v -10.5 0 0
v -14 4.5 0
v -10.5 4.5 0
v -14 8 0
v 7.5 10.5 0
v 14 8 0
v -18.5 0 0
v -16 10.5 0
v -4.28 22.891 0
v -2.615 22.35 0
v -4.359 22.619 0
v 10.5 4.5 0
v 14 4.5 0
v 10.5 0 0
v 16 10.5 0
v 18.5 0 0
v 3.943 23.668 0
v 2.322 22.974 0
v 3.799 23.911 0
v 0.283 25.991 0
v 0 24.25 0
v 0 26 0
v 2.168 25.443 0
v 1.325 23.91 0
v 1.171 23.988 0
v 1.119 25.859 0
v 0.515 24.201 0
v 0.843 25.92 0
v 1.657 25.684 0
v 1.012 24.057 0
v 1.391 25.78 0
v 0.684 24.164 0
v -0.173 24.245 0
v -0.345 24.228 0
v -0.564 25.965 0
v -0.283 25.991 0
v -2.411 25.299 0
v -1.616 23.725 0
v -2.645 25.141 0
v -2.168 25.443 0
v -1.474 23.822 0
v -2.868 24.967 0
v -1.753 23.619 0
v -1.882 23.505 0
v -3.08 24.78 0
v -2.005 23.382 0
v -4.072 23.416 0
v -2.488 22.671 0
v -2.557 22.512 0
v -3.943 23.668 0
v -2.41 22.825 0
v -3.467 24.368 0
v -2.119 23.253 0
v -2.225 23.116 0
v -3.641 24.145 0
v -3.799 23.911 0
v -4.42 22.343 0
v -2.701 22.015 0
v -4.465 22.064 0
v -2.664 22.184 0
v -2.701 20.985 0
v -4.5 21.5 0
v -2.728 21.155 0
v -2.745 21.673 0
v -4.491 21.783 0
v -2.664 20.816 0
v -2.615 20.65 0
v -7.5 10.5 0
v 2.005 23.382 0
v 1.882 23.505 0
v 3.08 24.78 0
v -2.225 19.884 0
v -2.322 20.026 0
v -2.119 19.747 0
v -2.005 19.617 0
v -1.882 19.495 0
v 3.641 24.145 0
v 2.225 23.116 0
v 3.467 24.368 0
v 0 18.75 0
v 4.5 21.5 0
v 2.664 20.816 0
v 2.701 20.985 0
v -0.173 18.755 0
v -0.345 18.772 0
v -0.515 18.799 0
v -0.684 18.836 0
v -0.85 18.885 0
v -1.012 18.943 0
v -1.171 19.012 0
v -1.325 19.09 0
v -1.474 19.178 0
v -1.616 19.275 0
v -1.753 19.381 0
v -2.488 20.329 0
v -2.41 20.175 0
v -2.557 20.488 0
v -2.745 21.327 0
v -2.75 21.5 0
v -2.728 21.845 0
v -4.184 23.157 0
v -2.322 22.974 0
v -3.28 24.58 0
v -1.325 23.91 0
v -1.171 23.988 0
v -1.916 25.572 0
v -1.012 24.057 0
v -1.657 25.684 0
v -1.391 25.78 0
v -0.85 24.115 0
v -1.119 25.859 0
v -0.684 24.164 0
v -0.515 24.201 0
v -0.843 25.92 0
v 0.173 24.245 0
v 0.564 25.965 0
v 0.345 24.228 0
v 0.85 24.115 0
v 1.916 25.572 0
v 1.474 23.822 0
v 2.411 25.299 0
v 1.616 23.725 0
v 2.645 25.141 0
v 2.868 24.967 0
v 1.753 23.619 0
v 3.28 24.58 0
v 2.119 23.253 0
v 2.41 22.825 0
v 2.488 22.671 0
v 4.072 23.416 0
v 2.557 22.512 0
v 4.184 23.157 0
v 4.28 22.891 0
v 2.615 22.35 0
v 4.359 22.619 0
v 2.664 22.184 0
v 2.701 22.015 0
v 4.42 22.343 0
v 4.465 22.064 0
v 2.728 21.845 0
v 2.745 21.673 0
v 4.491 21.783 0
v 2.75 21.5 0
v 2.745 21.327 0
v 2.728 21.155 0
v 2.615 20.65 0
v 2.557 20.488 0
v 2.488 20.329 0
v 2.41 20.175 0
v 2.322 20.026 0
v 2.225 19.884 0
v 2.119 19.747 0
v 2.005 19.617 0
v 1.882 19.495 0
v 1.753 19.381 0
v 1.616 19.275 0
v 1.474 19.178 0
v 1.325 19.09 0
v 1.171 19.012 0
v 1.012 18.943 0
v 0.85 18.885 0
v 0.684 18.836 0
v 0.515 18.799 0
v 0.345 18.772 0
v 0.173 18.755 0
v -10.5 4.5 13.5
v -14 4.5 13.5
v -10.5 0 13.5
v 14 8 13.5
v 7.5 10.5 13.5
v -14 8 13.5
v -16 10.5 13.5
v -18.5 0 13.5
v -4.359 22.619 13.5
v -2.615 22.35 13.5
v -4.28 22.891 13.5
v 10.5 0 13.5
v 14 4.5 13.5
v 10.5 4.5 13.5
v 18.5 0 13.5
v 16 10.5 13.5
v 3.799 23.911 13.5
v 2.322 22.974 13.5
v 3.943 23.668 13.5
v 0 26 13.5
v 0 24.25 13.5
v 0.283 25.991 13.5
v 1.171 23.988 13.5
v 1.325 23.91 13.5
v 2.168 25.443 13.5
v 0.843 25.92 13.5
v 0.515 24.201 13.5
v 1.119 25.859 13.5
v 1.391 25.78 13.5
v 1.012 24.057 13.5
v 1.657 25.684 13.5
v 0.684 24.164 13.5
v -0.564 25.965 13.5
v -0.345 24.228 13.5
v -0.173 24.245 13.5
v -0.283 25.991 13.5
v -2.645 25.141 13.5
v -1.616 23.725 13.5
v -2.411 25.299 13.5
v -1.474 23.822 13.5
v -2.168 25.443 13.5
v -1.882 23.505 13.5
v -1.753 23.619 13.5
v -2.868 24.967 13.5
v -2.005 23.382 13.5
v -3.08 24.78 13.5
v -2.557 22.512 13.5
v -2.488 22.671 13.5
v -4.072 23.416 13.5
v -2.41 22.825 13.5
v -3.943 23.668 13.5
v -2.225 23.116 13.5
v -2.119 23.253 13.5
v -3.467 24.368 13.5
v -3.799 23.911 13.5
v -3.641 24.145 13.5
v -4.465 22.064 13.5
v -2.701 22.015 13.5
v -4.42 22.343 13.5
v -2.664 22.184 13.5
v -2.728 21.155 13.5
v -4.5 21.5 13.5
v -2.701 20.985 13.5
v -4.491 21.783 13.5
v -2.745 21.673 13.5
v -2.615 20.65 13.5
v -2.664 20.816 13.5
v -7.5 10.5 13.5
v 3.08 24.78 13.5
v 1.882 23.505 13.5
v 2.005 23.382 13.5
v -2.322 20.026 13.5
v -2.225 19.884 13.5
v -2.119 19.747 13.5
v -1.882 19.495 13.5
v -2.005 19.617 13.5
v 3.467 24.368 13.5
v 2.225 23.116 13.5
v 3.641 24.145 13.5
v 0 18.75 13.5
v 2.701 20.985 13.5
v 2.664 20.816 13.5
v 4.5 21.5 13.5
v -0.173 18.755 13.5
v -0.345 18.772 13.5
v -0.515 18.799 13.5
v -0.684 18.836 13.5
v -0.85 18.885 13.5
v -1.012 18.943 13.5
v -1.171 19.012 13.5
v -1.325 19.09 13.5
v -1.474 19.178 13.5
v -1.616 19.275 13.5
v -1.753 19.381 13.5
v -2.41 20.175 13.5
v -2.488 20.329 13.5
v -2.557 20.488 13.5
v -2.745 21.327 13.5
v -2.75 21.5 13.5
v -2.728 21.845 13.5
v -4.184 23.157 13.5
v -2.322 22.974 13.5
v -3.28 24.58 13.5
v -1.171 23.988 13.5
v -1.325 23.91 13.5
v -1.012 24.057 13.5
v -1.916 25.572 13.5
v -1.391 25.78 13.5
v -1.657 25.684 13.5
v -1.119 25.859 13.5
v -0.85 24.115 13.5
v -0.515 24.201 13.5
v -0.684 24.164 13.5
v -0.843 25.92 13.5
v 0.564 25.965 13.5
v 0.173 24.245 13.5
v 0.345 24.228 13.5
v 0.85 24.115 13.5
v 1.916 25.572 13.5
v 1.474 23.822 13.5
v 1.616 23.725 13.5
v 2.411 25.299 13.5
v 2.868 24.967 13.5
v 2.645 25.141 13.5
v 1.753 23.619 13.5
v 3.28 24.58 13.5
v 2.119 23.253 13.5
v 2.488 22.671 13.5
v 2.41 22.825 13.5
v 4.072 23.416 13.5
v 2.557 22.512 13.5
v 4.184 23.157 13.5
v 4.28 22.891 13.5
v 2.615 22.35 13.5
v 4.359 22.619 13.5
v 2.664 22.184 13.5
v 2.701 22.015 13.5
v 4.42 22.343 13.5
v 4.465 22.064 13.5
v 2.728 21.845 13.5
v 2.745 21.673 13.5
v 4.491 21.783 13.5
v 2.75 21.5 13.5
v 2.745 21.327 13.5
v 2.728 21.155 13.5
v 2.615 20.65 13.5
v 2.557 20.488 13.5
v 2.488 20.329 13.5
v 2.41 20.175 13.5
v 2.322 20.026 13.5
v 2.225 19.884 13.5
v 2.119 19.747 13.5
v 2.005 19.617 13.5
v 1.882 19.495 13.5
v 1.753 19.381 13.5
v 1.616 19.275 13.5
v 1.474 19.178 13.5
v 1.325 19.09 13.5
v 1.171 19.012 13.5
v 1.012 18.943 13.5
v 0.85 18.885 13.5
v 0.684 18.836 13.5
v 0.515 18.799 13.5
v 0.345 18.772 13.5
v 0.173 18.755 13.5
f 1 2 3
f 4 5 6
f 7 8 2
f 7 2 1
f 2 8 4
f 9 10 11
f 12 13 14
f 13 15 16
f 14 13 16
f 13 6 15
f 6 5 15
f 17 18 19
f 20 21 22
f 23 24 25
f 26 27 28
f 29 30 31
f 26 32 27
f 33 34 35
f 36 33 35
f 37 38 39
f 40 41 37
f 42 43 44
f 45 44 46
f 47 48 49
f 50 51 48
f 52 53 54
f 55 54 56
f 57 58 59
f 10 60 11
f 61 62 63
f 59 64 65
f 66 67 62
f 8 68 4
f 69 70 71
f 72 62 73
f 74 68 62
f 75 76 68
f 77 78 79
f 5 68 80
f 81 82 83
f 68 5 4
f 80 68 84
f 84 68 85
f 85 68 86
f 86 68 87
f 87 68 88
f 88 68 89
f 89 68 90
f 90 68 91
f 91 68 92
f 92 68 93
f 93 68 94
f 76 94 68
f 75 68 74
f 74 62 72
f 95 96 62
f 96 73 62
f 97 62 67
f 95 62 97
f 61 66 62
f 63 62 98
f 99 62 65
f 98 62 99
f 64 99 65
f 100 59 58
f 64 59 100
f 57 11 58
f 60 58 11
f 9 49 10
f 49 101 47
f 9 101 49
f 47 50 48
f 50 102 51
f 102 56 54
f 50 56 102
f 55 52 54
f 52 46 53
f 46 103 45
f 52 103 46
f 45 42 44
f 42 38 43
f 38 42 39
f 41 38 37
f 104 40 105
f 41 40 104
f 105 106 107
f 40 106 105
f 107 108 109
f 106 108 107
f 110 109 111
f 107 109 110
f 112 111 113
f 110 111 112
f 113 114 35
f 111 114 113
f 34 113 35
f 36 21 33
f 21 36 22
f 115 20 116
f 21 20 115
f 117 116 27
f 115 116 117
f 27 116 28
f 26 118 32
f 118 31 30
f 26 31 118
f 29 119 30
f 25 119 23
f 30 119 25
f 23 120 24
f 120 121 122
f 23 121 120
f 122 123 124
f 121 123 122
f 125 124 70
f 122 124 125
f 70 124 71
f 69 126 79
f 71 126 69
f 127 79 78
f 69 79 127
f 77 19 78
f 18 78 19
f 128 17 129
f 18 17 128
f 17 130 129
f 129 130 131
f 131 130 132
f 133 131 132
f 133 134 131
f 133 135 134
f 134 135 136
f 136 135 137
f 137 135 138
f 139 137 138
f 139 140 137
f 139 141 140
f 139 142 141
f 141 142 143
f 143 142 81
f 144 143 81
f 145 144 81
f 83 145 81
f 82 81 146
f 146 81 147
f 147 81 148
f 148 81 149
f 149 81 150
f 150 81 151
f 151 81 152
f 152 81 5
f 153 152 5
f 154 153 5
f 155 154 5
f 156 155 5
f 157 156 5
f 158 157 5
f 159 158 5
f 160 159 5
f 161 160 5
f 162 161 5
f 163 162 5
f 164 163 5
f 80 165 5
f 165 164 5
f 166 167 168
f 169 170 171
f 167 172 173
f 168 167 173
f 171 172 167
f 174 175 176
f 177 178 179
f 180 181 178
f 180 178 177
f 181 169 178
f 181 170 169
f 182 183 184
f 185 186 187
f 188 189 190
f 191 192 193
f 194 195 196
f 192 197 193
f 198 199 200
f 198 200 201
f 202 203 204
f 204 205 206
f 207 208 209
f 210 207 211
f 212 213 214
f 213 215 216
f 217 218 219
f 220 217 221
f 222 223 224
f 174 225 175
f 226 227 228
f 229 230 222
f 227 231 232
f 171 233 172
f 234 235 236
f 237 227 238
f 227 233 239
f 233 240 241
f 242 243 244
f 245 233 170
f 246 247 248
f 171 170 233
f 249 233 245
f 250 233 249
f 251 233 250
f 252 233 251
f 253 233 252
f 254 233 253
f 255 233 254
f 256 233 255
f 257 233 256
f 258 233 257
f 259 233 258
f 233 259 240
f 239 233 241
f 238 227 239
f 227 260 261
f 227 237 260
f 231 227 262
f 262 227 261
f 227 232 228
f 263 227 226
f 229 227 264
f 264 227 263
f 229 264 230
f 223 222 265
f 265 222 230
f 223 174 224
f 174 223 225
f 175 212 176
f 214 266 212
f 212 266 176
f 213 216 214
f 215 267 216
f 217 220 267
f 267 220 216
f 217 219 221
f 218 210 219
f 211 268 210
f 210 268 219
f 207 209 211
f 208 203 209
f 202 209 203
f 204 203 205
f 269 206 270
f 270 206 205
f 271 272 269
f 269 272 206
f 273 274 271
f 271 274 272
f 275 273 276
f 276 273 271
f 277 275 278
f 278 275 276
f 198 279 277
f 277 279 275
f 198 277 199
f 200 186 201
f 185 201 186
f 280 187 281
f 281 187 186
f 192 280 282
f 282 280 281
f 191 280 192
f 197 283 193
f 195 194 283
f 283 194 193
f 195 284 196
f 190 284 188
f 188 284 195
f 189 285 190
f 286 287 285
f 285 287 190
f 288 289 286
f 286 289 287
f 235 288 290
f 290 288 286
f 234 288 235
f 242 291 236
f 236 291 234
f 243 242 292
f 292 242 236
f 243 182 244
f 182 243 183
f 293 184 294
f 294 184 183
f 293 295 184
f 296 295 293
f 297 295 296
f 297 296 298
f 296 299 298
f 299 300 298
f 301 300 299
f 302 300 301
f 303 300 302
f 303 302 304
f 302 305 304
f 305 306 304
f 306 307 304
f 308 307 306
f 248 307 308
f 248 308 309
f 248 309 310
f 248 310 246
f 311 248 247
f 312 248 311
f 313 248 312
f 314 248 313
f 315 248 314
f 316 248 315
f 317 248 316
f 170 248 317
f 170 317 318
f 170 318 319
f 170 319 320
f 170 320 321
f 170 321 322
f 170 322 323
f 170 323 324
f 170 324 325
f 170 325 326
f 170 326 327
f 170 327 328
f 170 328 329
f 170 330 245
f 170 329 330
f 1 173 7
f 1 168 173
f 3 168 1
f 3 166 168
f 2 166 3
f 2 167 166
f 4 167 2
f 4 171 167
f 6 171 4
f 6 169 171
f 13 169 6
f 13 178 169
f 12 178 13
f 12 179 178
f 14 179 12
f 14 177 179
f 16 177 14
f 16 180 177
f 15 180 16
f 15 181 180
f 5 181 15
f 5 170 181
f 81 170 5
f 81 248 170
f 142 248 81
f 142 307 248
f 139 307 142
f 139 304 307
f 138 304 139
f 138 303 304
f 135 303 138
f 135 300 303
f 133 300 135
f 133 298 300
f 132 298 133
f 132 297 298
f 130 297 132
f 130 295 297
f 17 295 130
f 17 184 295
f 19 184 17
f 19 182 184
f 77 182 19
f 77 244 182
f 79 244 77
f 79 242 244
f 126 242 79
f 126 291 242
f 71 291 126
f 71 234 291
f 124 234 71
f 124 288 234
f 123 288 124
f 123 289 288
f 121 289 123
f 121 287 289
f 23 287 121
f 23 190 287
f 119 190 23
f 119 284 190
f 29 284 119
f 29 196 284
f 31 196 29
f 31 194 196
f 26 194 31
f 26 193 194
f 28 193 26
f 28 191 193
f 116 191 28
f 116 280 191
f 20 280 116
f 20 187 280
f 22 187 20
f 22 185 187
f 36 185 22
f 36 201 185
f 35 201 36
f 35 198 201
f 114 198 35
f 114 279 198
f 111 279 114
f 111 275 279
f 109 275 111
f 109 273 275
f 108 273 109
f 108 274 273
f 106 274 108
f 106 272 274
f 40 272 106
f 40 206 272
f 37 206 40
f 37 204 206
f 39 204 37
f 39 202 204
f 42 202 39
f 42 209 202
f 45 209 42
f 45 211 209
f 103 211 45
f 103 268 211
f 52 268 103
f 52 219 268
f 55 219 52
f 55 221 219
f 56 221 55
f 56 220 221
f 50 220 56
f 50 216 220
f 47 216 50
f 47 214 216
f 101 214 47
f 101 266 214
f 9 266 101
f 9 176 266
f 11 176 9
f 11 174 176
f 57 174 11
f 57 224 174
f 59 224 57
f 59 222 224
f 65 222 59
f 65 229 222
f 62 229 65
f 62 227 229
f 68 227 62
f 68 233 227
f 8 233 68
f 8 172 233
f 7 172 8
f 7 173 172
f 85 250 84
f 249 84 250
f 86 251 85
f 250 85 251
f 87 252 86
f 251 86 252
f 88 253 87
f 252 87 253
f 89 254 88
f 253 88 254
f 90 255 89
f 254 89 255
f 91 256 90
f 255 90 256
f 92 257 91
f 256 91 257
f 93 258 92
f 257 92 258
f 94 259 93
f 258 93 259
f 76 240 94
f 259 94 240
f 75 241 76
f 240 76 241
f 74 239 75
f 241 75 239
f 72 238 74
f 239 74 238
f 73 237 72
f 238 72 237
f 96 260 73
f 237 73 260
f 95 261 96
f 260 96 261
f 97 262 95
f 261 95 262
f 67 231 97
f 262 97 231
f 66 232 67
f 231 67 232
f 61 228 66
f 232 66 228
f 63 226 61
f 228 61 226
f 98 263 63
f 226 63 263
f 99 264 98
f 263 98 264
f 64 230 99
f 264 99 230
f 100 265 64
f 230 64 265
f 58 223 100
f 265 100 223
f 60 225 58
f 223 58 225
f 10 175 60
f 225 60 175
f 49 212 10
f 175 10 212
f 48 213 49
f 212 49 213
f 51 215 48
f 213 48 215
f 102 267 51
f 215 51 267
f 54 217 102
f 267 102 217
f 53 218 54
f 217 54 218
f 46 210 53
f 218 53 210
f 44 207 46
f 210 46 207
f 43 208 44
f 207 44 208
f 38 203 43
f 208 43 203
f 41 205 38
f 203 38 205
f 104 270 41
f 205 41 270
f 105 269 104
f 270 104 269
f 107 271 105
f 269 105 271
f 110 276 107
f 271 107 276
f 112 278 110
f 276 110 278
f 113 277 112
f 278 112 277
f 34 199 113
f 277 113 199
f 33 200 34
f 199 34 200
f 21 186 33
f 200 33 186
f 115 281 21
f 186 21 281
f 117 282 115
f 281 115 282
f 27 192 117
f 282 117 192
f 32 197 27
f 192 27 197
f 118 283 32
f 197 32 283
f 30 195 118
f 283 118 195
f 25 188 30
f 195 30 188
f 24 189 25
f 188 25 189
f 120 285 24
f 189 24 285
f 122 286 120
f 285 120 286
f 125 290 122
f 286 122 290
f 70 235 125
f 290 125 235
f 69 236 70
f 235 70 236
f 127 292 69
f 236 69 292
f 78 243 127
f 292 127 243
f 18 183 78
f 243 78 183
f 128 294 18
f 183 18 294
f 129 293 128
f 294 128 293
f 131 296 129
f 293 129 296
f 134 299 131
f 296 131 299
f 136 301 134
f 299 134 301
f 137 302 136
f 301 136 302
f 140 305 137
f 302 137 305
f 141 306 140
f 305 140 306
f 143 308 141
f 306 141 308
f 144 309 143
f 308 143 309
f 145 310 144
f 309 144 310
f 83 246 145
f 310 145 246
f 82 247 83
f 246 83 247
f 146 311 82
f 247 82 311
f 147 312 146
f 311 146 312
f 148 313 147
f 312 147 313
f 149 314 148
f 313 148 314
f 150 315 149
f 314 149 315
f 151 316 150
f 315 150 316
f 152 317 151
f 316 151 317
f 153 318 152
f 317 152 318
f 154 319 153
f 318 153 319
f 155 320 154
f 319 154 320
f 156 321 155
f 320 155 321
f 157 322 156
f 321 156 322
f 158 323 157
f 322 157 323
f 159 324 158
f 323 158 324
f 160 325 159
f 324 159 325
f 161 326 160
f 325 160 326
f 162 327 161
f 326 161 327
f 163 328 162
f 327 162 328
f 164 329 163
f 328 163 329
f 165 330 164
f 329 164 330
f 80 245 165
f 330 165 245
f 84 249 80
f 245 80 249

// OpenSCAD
t = 13.5;
w_pillar = 15;
d_out = 9;
d_in = 5.5;
h_full = 26;
h_base = 10.5;
w_full = 37;
w_top = 32;
w_in = 28;
w_rail = 21;
h_groove = 8;
h_rail = 4.5;

module face() {
  difference() {
    polygon([
      [-w_full/2, 0],
      [-w_top/2, h_base],
      [w_top/2, h_base],
      [w_full/2, 0],
    ]);
    translate([-w_rail/2, -1]) {
      square([w_rail, h_groove + 1]);
    }
    translate([-w_in/2, h_rail]) {
      square([w_in, h_groove - h_rail]);
    }
  }
  difference() {
    union() {
      translate([0, h_base]) {
        polygon([
          [-w_pillar/2, 0],
          [-d_out/2, h_full - h_base - d_out/2],
          [d_out/2, h_full - h_base - d_out/2],
          [w_pillar/2, 0],
        ]);
      }
      translate([0, h_full - d_out/2]) {
        circle(d = d_out, $fn = 100);
      }
    }
    translate([0, h_full - d_out/2]) {
      circle(d = d_in, $fn = 100);
    }
  }
}

linear_extrude(height = t) face();
